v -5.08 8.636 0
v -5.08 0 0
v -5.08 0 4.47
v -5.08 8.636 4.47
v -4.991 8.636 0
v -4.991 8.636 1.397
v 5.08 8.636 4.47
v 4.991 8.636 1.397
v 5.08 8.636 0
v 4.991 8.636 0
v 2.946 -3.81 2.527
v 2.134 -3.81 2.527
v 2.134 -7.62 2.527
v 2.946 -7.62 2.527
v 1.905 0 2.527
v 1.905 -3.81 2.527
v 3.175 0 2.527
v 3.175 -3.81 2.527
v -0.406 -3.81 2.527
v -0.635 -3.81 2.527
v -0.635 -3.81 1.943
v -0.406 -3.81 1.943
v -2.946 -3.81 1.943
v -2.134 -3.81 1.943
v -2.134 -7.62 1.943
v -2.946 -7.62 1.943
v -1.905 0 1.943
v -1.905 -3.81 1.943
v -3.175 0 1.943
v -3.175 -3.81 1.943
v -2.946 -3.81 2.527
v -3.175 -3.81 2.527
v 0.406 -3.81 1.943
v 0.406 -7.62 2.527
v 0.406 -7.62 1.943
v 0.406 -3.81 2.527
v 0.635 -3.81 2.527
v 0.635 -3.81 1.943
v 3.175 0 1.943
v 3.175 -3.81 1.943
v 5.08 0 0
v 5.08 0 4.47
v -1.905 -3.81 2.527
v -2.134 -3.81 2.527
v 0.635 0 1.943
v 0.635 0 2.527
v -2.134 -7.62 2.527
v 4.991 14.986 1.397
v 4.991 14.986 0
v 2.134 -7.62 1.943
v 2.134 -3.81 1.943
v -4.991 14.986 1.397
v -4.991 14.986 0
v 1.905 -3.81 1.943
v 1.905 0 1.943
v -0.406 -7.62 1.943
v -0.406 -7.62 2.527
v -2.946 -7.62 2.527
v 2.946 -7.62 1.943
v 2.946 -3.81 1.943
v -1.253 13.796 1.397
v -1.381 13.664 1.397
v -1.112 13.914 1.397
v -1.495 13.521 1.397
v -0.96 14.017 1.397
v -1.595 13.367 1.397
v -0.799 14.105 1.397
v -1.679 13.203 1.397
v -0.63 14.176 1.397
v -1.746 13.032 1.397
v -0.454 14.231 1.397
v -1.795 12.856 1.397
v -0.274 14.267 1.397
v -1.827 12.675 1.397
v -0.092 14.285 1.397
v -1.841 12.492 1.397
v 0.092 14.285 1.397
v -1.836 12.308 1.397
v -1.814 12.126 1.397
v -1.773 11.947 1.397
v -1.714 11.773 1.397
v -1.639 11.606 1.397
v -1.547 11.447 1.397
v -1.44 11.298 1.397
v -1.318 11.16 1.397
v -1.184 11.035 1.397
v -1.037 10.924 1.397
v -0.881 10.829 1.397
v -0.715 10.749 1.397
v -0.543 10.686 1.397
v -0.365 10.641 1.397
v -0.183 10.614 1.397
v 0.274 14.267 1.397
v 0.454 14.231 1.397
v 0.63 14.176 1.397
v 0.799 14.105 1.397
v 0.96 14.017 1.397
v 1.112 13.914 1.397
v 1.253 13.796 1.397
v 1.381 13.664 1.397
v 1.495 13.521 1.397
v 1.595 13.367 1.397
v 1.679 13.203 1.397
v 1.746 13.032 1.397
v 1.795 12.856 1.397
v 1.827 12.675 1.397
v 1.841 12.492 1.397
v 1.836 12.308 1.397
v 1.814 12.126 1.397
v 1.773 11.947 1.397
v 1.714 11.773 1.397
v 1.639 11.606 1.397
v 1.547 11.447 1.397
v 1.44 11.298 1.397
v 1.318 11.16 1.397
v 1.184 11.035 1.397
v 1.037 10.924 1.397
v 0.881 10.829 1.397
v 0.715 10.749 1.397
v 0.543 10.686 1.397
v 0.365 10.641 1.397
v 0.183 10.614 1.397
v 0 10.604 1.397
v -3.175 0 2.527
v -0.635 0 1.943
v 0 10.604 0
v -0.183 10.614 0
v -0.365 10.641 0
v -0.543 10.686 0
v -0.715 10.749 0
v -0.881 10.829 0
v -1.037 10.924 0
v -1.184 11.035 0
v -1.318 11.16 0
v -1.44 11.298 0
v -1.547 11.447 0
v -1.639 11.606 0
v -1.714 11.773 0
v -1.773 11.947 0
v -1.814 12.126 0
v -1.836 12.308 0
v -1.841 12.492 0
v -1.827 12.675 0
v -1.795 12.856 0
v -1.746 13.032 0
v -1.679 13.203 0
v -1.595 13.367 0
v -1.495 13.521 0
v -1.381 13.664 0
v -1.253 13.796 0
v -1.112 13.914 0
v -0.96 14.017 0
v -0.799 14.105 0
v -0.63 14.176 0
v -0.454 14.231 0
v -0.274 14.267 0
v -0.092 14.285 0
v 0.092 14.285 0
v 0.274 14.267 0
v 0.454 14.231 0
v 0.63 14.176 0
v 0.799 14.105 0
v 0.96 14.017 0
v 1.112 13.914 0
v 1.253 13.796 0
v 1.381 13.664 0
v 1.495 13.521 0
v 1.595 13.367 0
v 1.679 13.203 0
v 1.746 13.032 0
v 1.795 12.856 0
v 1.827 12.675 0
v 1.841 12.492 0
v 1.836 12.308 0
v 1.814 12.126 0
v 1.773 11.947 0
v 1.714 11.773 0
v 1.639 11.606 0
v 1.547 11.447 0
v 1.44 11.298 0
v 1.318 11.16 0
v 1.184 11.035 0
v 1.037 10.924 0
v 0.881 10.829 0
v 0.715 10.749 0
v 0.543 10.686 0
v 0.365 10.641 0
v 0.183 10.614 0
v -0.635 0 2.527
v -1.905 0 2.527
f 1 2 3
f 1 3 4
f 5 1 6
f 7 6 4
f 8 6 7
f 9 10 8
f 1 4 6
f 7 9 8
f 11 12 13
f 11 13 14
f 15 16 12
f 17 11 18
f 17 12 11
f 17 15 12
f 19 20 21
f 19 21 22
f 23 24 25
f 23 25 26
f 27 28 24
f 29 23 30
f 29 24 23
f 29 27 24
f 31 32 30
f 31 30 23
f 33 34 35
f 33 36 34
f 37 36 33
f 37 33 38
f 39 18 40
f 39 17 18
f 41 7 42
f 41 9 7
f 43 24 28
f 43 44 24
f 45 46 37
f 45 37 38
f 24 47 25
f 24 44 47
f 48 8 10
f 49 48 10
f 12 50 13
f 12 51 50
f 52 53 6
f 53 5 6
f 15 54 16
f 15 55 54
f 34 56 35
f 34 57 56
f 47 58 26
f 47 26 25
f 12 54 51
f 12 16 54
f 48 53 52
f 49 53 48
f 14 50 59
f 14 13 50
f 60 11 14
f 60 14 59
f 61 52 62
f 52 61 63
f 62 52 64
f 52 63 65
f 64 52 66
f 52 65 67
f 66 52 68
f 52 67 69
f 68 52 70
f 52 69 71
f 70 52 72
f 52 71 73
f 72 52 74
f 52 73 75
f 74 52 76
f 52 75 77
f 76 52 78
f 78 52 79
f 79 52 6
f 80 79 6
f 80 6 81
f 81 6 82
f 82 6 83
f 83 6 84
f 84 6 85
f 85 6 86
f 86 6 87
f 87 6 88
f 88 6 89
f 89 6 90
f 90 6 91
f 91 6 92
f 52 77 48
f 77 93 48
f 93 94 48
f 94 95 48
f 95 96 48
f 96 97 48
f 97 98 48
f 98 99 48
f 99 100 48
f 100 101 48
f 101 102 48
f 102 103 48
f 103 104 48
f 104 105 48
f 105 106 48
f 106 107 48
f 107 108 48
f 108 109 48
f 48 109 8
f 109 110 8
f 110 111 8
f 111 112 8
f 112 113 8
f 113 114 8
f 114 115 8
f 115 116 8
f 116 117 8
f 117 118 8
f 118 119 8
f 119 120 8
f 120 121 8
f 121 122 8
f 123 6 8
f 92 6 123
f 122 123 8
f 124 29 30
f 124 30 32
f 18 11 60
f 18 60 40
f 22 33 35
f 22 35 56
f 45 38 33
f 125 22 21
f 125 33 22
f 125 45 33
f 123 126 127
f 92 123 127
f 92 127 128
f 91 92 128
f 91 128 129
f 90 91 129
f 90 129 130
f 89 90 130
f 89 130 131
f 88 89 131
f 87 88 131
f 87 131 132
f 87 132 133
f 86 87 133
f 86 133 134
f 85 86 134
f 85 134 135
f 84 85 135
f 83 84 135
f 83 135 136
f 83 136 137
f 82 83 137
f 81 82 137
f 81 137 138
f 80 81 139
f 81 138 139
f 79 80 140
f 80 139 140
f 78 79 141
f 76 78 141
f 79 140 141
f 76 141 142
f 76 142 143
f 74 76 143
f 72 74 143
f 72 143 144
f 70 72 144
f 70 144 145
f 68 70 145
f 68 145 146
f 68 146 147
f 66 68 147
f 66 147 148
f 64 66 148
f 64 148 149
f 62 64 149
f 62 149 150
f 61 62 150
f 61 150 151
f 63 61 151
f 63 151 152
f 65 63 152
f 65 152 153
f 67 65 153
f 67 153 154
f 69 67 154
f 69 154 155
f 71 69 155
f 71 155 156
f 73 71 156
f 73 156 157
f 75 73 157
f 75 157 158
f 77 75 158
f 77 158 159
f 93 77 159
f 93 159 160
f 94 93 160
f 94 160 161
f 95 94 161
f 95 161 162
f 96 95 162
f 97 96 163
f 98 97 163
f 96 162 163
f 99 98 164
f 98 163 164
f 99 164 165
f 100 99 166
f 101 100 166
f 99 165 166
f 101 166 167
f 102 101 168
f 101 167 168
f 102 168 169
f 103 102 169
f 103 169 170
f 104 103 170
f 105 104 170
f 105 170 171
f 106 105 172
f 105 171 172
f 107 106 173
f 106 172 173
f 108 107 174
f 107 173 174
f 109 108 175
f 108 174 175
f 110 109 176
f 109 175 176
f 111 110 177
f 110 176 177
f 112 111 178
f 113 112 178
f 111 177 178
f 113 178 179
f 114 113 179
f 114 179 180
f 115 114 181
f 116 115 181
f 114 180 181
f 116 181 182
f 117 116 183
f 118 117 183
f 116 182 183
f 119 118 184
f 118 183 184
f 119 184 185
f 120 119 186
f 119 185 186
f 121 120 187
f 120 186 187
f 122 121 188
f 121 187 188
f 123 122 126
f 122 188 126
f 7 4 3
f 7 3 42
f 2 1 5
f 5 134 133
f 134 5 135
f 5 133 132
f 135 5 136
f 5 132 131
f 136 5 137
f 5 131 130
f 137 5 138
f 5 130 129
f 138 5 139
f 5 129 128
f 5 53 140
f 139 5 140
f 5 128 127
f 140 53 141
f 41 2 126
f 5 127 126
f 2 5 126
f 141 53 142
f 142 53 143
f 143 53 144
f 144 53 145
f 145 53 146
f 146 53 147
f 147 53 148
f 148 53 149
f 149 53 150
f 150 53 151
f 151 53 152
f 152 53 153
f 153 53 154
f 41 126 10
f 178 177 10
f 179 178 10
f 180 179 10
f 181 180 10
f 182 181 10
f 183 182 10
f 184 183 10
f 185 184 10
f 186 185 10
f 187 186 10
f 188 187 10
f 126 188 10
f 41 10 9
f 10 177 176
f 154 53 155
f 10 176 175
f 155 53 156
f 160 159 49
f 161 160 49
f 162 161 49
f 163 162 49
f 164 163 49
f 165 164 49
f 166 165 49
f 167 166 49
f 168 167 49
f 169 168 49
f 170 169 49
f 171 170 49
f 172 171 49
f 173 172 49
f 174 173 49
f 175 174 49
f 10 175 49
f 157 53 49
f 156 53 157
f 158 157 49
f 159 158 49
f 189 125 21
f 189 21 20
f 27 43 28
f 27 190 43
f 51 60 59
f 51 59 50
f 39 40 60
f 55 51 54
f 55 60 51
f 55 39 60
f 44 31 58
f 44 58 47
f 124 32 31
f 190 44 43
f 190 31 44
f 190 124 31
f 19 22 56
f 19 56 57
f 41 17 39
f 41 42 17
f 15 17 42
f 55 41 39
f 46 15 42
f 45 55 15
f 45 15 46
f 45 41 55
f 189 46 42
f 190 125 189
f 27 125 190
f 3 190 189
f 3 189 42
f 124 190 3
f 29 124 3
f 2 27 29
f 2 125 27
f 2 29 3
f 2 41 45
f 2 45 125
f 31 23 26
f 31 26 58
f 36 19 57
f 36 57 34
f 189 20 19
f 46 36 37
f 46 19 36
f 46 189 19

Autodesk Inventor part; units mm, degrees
ref_plane "YZ Plane" through (0, 0, 0) normal (1, 0, 0) x (0, 1, 0)
ref_plane "XZ Plane" through (0, 0, 0) normal (0, 1, 0) x (-1, 0, 0)
ref_plane "XY Plane" through (0, 0, 0) normal (0, 0, 1) x (1, 0, 0)
sketch "Sketch1" plane through (0, 0, 0) normal (0, 0, 1) x (1, 0, 0)
  line L0 (-5.08, 8.636) -> (5.08, 8.636)
  line L1 (5.08, 8.636) -> (5.08, 0)
  line L2 (5.08, 0) -> (-5.08, 0)
  line L3 (-5.08, 0) -> (-5.08, 8.636)
  point P0 (0, 0)
  point P1 (0, 0)
  dimension "d0" = 10.16
  dimension "d1" = 8.636
extrude "Extrusion1" add sketch "Sketch1" along normal blind 4.4704
sketch "Sketch2" plane through (-5.08, 8.636, 0) normal (0, 1, 0) x (1, 0, 0)
  line L0 (0.0889, -1.397) -> (10.0711, -1.397)
  line L1 (10.0711, -1.397) -> (10.0711, 0)
  line L2 (10.0711, 0) -> (0.0889, 0)
  line L3 (0.0889, 0) -> (0.0889, -1.397)
  line L4 (0, 0) -> (10.16, 0) projected
  point P0 (5.08, 0)
  dimension "d7" = 1.397
  dimension "d8" = 9.9822
extrude "Extrusion2" add sketch "Sketch2" along normal blind 6.35
sketch "Sketch3" plane through (-4.9911, 8.636, 1.397) normal (0, 0, 1) x (1, 0, 0)
  line L0 (9.9822, 6.35) -> (0, 6.35) projected
  line L1 (9.9822, 0) -> (9.9822, 6.35) projected
  line L2 (4.9911, 6.35) -> (4.9911, 1.588) construction
  point P0 (4.9911, 3.81)
  dimension "d9" = 2.54
hole "Hole1" at (0, 12.446, 1.397) direction (0, 0, -1) diameter 3.683 end through all
sketch "Sketch4" plane through (-5.08, 0, 0) normal (0, -1, 0) x (1, 0, 0)
  line L0 (0, 0) -> (0, 4.4704) projected
  line L1 (10.16, 0) -> (10.16, 4.4704) projected
  line L2 (0, 2.2352) -> (10.16, 2.2352) construction
  line L3 (1.905, 2.5273) -> (3.175, 2.5273)
  line L4 (3.175, 2.5273) -> (3.175, 1.9431)
  line L5 (3.175, 1.9431) -> (1.905, 1.9431)
  line L6 (1.905, 1.9431) -> (1.905, 2.5273)
  point P0 (1.905, 2.2352)
  dimension "d17" = 0.5842
  dimension "d18" = 1.27
  dimension "d19" = 1.905
extrude "Extrusion3" add sketch "Sketch4" along normal blind 3.81
sketch "Sketch5" plane through (-5.08, -3.81, 0) normal (0, -1, 0) x (1, 0, 0)
  line L0 (1.905, 2.5273) -> (3.175, 2.5273) projected
  line L1 (3.175, 1.9431) -> (1.905, 1.9431) projected
  line L2 (2.1336, 2.5273) -> (2.9464, 2.5273)
  line L3 (2.9464, 2.5273) -> (2.9464, 1.9431)
  line L4 (2.9464, 1.9431) -> (2.1336, 1.9431)
  line L5 (2.1336, 1.9431) -> (2.1336, 2.5273)
  point P0 (2.54, 1.9431)
  dimension "d22" = 0.8128
extrude "Extrusion4" add sketch "Sketch5" along normal blind 3.81
pattern_linear "Rectangular Pattern1" count 3 spacing 2.54 along (1, 0, 0) of "Extrusion4", "Extrusion3"
properties part number "Fet"
